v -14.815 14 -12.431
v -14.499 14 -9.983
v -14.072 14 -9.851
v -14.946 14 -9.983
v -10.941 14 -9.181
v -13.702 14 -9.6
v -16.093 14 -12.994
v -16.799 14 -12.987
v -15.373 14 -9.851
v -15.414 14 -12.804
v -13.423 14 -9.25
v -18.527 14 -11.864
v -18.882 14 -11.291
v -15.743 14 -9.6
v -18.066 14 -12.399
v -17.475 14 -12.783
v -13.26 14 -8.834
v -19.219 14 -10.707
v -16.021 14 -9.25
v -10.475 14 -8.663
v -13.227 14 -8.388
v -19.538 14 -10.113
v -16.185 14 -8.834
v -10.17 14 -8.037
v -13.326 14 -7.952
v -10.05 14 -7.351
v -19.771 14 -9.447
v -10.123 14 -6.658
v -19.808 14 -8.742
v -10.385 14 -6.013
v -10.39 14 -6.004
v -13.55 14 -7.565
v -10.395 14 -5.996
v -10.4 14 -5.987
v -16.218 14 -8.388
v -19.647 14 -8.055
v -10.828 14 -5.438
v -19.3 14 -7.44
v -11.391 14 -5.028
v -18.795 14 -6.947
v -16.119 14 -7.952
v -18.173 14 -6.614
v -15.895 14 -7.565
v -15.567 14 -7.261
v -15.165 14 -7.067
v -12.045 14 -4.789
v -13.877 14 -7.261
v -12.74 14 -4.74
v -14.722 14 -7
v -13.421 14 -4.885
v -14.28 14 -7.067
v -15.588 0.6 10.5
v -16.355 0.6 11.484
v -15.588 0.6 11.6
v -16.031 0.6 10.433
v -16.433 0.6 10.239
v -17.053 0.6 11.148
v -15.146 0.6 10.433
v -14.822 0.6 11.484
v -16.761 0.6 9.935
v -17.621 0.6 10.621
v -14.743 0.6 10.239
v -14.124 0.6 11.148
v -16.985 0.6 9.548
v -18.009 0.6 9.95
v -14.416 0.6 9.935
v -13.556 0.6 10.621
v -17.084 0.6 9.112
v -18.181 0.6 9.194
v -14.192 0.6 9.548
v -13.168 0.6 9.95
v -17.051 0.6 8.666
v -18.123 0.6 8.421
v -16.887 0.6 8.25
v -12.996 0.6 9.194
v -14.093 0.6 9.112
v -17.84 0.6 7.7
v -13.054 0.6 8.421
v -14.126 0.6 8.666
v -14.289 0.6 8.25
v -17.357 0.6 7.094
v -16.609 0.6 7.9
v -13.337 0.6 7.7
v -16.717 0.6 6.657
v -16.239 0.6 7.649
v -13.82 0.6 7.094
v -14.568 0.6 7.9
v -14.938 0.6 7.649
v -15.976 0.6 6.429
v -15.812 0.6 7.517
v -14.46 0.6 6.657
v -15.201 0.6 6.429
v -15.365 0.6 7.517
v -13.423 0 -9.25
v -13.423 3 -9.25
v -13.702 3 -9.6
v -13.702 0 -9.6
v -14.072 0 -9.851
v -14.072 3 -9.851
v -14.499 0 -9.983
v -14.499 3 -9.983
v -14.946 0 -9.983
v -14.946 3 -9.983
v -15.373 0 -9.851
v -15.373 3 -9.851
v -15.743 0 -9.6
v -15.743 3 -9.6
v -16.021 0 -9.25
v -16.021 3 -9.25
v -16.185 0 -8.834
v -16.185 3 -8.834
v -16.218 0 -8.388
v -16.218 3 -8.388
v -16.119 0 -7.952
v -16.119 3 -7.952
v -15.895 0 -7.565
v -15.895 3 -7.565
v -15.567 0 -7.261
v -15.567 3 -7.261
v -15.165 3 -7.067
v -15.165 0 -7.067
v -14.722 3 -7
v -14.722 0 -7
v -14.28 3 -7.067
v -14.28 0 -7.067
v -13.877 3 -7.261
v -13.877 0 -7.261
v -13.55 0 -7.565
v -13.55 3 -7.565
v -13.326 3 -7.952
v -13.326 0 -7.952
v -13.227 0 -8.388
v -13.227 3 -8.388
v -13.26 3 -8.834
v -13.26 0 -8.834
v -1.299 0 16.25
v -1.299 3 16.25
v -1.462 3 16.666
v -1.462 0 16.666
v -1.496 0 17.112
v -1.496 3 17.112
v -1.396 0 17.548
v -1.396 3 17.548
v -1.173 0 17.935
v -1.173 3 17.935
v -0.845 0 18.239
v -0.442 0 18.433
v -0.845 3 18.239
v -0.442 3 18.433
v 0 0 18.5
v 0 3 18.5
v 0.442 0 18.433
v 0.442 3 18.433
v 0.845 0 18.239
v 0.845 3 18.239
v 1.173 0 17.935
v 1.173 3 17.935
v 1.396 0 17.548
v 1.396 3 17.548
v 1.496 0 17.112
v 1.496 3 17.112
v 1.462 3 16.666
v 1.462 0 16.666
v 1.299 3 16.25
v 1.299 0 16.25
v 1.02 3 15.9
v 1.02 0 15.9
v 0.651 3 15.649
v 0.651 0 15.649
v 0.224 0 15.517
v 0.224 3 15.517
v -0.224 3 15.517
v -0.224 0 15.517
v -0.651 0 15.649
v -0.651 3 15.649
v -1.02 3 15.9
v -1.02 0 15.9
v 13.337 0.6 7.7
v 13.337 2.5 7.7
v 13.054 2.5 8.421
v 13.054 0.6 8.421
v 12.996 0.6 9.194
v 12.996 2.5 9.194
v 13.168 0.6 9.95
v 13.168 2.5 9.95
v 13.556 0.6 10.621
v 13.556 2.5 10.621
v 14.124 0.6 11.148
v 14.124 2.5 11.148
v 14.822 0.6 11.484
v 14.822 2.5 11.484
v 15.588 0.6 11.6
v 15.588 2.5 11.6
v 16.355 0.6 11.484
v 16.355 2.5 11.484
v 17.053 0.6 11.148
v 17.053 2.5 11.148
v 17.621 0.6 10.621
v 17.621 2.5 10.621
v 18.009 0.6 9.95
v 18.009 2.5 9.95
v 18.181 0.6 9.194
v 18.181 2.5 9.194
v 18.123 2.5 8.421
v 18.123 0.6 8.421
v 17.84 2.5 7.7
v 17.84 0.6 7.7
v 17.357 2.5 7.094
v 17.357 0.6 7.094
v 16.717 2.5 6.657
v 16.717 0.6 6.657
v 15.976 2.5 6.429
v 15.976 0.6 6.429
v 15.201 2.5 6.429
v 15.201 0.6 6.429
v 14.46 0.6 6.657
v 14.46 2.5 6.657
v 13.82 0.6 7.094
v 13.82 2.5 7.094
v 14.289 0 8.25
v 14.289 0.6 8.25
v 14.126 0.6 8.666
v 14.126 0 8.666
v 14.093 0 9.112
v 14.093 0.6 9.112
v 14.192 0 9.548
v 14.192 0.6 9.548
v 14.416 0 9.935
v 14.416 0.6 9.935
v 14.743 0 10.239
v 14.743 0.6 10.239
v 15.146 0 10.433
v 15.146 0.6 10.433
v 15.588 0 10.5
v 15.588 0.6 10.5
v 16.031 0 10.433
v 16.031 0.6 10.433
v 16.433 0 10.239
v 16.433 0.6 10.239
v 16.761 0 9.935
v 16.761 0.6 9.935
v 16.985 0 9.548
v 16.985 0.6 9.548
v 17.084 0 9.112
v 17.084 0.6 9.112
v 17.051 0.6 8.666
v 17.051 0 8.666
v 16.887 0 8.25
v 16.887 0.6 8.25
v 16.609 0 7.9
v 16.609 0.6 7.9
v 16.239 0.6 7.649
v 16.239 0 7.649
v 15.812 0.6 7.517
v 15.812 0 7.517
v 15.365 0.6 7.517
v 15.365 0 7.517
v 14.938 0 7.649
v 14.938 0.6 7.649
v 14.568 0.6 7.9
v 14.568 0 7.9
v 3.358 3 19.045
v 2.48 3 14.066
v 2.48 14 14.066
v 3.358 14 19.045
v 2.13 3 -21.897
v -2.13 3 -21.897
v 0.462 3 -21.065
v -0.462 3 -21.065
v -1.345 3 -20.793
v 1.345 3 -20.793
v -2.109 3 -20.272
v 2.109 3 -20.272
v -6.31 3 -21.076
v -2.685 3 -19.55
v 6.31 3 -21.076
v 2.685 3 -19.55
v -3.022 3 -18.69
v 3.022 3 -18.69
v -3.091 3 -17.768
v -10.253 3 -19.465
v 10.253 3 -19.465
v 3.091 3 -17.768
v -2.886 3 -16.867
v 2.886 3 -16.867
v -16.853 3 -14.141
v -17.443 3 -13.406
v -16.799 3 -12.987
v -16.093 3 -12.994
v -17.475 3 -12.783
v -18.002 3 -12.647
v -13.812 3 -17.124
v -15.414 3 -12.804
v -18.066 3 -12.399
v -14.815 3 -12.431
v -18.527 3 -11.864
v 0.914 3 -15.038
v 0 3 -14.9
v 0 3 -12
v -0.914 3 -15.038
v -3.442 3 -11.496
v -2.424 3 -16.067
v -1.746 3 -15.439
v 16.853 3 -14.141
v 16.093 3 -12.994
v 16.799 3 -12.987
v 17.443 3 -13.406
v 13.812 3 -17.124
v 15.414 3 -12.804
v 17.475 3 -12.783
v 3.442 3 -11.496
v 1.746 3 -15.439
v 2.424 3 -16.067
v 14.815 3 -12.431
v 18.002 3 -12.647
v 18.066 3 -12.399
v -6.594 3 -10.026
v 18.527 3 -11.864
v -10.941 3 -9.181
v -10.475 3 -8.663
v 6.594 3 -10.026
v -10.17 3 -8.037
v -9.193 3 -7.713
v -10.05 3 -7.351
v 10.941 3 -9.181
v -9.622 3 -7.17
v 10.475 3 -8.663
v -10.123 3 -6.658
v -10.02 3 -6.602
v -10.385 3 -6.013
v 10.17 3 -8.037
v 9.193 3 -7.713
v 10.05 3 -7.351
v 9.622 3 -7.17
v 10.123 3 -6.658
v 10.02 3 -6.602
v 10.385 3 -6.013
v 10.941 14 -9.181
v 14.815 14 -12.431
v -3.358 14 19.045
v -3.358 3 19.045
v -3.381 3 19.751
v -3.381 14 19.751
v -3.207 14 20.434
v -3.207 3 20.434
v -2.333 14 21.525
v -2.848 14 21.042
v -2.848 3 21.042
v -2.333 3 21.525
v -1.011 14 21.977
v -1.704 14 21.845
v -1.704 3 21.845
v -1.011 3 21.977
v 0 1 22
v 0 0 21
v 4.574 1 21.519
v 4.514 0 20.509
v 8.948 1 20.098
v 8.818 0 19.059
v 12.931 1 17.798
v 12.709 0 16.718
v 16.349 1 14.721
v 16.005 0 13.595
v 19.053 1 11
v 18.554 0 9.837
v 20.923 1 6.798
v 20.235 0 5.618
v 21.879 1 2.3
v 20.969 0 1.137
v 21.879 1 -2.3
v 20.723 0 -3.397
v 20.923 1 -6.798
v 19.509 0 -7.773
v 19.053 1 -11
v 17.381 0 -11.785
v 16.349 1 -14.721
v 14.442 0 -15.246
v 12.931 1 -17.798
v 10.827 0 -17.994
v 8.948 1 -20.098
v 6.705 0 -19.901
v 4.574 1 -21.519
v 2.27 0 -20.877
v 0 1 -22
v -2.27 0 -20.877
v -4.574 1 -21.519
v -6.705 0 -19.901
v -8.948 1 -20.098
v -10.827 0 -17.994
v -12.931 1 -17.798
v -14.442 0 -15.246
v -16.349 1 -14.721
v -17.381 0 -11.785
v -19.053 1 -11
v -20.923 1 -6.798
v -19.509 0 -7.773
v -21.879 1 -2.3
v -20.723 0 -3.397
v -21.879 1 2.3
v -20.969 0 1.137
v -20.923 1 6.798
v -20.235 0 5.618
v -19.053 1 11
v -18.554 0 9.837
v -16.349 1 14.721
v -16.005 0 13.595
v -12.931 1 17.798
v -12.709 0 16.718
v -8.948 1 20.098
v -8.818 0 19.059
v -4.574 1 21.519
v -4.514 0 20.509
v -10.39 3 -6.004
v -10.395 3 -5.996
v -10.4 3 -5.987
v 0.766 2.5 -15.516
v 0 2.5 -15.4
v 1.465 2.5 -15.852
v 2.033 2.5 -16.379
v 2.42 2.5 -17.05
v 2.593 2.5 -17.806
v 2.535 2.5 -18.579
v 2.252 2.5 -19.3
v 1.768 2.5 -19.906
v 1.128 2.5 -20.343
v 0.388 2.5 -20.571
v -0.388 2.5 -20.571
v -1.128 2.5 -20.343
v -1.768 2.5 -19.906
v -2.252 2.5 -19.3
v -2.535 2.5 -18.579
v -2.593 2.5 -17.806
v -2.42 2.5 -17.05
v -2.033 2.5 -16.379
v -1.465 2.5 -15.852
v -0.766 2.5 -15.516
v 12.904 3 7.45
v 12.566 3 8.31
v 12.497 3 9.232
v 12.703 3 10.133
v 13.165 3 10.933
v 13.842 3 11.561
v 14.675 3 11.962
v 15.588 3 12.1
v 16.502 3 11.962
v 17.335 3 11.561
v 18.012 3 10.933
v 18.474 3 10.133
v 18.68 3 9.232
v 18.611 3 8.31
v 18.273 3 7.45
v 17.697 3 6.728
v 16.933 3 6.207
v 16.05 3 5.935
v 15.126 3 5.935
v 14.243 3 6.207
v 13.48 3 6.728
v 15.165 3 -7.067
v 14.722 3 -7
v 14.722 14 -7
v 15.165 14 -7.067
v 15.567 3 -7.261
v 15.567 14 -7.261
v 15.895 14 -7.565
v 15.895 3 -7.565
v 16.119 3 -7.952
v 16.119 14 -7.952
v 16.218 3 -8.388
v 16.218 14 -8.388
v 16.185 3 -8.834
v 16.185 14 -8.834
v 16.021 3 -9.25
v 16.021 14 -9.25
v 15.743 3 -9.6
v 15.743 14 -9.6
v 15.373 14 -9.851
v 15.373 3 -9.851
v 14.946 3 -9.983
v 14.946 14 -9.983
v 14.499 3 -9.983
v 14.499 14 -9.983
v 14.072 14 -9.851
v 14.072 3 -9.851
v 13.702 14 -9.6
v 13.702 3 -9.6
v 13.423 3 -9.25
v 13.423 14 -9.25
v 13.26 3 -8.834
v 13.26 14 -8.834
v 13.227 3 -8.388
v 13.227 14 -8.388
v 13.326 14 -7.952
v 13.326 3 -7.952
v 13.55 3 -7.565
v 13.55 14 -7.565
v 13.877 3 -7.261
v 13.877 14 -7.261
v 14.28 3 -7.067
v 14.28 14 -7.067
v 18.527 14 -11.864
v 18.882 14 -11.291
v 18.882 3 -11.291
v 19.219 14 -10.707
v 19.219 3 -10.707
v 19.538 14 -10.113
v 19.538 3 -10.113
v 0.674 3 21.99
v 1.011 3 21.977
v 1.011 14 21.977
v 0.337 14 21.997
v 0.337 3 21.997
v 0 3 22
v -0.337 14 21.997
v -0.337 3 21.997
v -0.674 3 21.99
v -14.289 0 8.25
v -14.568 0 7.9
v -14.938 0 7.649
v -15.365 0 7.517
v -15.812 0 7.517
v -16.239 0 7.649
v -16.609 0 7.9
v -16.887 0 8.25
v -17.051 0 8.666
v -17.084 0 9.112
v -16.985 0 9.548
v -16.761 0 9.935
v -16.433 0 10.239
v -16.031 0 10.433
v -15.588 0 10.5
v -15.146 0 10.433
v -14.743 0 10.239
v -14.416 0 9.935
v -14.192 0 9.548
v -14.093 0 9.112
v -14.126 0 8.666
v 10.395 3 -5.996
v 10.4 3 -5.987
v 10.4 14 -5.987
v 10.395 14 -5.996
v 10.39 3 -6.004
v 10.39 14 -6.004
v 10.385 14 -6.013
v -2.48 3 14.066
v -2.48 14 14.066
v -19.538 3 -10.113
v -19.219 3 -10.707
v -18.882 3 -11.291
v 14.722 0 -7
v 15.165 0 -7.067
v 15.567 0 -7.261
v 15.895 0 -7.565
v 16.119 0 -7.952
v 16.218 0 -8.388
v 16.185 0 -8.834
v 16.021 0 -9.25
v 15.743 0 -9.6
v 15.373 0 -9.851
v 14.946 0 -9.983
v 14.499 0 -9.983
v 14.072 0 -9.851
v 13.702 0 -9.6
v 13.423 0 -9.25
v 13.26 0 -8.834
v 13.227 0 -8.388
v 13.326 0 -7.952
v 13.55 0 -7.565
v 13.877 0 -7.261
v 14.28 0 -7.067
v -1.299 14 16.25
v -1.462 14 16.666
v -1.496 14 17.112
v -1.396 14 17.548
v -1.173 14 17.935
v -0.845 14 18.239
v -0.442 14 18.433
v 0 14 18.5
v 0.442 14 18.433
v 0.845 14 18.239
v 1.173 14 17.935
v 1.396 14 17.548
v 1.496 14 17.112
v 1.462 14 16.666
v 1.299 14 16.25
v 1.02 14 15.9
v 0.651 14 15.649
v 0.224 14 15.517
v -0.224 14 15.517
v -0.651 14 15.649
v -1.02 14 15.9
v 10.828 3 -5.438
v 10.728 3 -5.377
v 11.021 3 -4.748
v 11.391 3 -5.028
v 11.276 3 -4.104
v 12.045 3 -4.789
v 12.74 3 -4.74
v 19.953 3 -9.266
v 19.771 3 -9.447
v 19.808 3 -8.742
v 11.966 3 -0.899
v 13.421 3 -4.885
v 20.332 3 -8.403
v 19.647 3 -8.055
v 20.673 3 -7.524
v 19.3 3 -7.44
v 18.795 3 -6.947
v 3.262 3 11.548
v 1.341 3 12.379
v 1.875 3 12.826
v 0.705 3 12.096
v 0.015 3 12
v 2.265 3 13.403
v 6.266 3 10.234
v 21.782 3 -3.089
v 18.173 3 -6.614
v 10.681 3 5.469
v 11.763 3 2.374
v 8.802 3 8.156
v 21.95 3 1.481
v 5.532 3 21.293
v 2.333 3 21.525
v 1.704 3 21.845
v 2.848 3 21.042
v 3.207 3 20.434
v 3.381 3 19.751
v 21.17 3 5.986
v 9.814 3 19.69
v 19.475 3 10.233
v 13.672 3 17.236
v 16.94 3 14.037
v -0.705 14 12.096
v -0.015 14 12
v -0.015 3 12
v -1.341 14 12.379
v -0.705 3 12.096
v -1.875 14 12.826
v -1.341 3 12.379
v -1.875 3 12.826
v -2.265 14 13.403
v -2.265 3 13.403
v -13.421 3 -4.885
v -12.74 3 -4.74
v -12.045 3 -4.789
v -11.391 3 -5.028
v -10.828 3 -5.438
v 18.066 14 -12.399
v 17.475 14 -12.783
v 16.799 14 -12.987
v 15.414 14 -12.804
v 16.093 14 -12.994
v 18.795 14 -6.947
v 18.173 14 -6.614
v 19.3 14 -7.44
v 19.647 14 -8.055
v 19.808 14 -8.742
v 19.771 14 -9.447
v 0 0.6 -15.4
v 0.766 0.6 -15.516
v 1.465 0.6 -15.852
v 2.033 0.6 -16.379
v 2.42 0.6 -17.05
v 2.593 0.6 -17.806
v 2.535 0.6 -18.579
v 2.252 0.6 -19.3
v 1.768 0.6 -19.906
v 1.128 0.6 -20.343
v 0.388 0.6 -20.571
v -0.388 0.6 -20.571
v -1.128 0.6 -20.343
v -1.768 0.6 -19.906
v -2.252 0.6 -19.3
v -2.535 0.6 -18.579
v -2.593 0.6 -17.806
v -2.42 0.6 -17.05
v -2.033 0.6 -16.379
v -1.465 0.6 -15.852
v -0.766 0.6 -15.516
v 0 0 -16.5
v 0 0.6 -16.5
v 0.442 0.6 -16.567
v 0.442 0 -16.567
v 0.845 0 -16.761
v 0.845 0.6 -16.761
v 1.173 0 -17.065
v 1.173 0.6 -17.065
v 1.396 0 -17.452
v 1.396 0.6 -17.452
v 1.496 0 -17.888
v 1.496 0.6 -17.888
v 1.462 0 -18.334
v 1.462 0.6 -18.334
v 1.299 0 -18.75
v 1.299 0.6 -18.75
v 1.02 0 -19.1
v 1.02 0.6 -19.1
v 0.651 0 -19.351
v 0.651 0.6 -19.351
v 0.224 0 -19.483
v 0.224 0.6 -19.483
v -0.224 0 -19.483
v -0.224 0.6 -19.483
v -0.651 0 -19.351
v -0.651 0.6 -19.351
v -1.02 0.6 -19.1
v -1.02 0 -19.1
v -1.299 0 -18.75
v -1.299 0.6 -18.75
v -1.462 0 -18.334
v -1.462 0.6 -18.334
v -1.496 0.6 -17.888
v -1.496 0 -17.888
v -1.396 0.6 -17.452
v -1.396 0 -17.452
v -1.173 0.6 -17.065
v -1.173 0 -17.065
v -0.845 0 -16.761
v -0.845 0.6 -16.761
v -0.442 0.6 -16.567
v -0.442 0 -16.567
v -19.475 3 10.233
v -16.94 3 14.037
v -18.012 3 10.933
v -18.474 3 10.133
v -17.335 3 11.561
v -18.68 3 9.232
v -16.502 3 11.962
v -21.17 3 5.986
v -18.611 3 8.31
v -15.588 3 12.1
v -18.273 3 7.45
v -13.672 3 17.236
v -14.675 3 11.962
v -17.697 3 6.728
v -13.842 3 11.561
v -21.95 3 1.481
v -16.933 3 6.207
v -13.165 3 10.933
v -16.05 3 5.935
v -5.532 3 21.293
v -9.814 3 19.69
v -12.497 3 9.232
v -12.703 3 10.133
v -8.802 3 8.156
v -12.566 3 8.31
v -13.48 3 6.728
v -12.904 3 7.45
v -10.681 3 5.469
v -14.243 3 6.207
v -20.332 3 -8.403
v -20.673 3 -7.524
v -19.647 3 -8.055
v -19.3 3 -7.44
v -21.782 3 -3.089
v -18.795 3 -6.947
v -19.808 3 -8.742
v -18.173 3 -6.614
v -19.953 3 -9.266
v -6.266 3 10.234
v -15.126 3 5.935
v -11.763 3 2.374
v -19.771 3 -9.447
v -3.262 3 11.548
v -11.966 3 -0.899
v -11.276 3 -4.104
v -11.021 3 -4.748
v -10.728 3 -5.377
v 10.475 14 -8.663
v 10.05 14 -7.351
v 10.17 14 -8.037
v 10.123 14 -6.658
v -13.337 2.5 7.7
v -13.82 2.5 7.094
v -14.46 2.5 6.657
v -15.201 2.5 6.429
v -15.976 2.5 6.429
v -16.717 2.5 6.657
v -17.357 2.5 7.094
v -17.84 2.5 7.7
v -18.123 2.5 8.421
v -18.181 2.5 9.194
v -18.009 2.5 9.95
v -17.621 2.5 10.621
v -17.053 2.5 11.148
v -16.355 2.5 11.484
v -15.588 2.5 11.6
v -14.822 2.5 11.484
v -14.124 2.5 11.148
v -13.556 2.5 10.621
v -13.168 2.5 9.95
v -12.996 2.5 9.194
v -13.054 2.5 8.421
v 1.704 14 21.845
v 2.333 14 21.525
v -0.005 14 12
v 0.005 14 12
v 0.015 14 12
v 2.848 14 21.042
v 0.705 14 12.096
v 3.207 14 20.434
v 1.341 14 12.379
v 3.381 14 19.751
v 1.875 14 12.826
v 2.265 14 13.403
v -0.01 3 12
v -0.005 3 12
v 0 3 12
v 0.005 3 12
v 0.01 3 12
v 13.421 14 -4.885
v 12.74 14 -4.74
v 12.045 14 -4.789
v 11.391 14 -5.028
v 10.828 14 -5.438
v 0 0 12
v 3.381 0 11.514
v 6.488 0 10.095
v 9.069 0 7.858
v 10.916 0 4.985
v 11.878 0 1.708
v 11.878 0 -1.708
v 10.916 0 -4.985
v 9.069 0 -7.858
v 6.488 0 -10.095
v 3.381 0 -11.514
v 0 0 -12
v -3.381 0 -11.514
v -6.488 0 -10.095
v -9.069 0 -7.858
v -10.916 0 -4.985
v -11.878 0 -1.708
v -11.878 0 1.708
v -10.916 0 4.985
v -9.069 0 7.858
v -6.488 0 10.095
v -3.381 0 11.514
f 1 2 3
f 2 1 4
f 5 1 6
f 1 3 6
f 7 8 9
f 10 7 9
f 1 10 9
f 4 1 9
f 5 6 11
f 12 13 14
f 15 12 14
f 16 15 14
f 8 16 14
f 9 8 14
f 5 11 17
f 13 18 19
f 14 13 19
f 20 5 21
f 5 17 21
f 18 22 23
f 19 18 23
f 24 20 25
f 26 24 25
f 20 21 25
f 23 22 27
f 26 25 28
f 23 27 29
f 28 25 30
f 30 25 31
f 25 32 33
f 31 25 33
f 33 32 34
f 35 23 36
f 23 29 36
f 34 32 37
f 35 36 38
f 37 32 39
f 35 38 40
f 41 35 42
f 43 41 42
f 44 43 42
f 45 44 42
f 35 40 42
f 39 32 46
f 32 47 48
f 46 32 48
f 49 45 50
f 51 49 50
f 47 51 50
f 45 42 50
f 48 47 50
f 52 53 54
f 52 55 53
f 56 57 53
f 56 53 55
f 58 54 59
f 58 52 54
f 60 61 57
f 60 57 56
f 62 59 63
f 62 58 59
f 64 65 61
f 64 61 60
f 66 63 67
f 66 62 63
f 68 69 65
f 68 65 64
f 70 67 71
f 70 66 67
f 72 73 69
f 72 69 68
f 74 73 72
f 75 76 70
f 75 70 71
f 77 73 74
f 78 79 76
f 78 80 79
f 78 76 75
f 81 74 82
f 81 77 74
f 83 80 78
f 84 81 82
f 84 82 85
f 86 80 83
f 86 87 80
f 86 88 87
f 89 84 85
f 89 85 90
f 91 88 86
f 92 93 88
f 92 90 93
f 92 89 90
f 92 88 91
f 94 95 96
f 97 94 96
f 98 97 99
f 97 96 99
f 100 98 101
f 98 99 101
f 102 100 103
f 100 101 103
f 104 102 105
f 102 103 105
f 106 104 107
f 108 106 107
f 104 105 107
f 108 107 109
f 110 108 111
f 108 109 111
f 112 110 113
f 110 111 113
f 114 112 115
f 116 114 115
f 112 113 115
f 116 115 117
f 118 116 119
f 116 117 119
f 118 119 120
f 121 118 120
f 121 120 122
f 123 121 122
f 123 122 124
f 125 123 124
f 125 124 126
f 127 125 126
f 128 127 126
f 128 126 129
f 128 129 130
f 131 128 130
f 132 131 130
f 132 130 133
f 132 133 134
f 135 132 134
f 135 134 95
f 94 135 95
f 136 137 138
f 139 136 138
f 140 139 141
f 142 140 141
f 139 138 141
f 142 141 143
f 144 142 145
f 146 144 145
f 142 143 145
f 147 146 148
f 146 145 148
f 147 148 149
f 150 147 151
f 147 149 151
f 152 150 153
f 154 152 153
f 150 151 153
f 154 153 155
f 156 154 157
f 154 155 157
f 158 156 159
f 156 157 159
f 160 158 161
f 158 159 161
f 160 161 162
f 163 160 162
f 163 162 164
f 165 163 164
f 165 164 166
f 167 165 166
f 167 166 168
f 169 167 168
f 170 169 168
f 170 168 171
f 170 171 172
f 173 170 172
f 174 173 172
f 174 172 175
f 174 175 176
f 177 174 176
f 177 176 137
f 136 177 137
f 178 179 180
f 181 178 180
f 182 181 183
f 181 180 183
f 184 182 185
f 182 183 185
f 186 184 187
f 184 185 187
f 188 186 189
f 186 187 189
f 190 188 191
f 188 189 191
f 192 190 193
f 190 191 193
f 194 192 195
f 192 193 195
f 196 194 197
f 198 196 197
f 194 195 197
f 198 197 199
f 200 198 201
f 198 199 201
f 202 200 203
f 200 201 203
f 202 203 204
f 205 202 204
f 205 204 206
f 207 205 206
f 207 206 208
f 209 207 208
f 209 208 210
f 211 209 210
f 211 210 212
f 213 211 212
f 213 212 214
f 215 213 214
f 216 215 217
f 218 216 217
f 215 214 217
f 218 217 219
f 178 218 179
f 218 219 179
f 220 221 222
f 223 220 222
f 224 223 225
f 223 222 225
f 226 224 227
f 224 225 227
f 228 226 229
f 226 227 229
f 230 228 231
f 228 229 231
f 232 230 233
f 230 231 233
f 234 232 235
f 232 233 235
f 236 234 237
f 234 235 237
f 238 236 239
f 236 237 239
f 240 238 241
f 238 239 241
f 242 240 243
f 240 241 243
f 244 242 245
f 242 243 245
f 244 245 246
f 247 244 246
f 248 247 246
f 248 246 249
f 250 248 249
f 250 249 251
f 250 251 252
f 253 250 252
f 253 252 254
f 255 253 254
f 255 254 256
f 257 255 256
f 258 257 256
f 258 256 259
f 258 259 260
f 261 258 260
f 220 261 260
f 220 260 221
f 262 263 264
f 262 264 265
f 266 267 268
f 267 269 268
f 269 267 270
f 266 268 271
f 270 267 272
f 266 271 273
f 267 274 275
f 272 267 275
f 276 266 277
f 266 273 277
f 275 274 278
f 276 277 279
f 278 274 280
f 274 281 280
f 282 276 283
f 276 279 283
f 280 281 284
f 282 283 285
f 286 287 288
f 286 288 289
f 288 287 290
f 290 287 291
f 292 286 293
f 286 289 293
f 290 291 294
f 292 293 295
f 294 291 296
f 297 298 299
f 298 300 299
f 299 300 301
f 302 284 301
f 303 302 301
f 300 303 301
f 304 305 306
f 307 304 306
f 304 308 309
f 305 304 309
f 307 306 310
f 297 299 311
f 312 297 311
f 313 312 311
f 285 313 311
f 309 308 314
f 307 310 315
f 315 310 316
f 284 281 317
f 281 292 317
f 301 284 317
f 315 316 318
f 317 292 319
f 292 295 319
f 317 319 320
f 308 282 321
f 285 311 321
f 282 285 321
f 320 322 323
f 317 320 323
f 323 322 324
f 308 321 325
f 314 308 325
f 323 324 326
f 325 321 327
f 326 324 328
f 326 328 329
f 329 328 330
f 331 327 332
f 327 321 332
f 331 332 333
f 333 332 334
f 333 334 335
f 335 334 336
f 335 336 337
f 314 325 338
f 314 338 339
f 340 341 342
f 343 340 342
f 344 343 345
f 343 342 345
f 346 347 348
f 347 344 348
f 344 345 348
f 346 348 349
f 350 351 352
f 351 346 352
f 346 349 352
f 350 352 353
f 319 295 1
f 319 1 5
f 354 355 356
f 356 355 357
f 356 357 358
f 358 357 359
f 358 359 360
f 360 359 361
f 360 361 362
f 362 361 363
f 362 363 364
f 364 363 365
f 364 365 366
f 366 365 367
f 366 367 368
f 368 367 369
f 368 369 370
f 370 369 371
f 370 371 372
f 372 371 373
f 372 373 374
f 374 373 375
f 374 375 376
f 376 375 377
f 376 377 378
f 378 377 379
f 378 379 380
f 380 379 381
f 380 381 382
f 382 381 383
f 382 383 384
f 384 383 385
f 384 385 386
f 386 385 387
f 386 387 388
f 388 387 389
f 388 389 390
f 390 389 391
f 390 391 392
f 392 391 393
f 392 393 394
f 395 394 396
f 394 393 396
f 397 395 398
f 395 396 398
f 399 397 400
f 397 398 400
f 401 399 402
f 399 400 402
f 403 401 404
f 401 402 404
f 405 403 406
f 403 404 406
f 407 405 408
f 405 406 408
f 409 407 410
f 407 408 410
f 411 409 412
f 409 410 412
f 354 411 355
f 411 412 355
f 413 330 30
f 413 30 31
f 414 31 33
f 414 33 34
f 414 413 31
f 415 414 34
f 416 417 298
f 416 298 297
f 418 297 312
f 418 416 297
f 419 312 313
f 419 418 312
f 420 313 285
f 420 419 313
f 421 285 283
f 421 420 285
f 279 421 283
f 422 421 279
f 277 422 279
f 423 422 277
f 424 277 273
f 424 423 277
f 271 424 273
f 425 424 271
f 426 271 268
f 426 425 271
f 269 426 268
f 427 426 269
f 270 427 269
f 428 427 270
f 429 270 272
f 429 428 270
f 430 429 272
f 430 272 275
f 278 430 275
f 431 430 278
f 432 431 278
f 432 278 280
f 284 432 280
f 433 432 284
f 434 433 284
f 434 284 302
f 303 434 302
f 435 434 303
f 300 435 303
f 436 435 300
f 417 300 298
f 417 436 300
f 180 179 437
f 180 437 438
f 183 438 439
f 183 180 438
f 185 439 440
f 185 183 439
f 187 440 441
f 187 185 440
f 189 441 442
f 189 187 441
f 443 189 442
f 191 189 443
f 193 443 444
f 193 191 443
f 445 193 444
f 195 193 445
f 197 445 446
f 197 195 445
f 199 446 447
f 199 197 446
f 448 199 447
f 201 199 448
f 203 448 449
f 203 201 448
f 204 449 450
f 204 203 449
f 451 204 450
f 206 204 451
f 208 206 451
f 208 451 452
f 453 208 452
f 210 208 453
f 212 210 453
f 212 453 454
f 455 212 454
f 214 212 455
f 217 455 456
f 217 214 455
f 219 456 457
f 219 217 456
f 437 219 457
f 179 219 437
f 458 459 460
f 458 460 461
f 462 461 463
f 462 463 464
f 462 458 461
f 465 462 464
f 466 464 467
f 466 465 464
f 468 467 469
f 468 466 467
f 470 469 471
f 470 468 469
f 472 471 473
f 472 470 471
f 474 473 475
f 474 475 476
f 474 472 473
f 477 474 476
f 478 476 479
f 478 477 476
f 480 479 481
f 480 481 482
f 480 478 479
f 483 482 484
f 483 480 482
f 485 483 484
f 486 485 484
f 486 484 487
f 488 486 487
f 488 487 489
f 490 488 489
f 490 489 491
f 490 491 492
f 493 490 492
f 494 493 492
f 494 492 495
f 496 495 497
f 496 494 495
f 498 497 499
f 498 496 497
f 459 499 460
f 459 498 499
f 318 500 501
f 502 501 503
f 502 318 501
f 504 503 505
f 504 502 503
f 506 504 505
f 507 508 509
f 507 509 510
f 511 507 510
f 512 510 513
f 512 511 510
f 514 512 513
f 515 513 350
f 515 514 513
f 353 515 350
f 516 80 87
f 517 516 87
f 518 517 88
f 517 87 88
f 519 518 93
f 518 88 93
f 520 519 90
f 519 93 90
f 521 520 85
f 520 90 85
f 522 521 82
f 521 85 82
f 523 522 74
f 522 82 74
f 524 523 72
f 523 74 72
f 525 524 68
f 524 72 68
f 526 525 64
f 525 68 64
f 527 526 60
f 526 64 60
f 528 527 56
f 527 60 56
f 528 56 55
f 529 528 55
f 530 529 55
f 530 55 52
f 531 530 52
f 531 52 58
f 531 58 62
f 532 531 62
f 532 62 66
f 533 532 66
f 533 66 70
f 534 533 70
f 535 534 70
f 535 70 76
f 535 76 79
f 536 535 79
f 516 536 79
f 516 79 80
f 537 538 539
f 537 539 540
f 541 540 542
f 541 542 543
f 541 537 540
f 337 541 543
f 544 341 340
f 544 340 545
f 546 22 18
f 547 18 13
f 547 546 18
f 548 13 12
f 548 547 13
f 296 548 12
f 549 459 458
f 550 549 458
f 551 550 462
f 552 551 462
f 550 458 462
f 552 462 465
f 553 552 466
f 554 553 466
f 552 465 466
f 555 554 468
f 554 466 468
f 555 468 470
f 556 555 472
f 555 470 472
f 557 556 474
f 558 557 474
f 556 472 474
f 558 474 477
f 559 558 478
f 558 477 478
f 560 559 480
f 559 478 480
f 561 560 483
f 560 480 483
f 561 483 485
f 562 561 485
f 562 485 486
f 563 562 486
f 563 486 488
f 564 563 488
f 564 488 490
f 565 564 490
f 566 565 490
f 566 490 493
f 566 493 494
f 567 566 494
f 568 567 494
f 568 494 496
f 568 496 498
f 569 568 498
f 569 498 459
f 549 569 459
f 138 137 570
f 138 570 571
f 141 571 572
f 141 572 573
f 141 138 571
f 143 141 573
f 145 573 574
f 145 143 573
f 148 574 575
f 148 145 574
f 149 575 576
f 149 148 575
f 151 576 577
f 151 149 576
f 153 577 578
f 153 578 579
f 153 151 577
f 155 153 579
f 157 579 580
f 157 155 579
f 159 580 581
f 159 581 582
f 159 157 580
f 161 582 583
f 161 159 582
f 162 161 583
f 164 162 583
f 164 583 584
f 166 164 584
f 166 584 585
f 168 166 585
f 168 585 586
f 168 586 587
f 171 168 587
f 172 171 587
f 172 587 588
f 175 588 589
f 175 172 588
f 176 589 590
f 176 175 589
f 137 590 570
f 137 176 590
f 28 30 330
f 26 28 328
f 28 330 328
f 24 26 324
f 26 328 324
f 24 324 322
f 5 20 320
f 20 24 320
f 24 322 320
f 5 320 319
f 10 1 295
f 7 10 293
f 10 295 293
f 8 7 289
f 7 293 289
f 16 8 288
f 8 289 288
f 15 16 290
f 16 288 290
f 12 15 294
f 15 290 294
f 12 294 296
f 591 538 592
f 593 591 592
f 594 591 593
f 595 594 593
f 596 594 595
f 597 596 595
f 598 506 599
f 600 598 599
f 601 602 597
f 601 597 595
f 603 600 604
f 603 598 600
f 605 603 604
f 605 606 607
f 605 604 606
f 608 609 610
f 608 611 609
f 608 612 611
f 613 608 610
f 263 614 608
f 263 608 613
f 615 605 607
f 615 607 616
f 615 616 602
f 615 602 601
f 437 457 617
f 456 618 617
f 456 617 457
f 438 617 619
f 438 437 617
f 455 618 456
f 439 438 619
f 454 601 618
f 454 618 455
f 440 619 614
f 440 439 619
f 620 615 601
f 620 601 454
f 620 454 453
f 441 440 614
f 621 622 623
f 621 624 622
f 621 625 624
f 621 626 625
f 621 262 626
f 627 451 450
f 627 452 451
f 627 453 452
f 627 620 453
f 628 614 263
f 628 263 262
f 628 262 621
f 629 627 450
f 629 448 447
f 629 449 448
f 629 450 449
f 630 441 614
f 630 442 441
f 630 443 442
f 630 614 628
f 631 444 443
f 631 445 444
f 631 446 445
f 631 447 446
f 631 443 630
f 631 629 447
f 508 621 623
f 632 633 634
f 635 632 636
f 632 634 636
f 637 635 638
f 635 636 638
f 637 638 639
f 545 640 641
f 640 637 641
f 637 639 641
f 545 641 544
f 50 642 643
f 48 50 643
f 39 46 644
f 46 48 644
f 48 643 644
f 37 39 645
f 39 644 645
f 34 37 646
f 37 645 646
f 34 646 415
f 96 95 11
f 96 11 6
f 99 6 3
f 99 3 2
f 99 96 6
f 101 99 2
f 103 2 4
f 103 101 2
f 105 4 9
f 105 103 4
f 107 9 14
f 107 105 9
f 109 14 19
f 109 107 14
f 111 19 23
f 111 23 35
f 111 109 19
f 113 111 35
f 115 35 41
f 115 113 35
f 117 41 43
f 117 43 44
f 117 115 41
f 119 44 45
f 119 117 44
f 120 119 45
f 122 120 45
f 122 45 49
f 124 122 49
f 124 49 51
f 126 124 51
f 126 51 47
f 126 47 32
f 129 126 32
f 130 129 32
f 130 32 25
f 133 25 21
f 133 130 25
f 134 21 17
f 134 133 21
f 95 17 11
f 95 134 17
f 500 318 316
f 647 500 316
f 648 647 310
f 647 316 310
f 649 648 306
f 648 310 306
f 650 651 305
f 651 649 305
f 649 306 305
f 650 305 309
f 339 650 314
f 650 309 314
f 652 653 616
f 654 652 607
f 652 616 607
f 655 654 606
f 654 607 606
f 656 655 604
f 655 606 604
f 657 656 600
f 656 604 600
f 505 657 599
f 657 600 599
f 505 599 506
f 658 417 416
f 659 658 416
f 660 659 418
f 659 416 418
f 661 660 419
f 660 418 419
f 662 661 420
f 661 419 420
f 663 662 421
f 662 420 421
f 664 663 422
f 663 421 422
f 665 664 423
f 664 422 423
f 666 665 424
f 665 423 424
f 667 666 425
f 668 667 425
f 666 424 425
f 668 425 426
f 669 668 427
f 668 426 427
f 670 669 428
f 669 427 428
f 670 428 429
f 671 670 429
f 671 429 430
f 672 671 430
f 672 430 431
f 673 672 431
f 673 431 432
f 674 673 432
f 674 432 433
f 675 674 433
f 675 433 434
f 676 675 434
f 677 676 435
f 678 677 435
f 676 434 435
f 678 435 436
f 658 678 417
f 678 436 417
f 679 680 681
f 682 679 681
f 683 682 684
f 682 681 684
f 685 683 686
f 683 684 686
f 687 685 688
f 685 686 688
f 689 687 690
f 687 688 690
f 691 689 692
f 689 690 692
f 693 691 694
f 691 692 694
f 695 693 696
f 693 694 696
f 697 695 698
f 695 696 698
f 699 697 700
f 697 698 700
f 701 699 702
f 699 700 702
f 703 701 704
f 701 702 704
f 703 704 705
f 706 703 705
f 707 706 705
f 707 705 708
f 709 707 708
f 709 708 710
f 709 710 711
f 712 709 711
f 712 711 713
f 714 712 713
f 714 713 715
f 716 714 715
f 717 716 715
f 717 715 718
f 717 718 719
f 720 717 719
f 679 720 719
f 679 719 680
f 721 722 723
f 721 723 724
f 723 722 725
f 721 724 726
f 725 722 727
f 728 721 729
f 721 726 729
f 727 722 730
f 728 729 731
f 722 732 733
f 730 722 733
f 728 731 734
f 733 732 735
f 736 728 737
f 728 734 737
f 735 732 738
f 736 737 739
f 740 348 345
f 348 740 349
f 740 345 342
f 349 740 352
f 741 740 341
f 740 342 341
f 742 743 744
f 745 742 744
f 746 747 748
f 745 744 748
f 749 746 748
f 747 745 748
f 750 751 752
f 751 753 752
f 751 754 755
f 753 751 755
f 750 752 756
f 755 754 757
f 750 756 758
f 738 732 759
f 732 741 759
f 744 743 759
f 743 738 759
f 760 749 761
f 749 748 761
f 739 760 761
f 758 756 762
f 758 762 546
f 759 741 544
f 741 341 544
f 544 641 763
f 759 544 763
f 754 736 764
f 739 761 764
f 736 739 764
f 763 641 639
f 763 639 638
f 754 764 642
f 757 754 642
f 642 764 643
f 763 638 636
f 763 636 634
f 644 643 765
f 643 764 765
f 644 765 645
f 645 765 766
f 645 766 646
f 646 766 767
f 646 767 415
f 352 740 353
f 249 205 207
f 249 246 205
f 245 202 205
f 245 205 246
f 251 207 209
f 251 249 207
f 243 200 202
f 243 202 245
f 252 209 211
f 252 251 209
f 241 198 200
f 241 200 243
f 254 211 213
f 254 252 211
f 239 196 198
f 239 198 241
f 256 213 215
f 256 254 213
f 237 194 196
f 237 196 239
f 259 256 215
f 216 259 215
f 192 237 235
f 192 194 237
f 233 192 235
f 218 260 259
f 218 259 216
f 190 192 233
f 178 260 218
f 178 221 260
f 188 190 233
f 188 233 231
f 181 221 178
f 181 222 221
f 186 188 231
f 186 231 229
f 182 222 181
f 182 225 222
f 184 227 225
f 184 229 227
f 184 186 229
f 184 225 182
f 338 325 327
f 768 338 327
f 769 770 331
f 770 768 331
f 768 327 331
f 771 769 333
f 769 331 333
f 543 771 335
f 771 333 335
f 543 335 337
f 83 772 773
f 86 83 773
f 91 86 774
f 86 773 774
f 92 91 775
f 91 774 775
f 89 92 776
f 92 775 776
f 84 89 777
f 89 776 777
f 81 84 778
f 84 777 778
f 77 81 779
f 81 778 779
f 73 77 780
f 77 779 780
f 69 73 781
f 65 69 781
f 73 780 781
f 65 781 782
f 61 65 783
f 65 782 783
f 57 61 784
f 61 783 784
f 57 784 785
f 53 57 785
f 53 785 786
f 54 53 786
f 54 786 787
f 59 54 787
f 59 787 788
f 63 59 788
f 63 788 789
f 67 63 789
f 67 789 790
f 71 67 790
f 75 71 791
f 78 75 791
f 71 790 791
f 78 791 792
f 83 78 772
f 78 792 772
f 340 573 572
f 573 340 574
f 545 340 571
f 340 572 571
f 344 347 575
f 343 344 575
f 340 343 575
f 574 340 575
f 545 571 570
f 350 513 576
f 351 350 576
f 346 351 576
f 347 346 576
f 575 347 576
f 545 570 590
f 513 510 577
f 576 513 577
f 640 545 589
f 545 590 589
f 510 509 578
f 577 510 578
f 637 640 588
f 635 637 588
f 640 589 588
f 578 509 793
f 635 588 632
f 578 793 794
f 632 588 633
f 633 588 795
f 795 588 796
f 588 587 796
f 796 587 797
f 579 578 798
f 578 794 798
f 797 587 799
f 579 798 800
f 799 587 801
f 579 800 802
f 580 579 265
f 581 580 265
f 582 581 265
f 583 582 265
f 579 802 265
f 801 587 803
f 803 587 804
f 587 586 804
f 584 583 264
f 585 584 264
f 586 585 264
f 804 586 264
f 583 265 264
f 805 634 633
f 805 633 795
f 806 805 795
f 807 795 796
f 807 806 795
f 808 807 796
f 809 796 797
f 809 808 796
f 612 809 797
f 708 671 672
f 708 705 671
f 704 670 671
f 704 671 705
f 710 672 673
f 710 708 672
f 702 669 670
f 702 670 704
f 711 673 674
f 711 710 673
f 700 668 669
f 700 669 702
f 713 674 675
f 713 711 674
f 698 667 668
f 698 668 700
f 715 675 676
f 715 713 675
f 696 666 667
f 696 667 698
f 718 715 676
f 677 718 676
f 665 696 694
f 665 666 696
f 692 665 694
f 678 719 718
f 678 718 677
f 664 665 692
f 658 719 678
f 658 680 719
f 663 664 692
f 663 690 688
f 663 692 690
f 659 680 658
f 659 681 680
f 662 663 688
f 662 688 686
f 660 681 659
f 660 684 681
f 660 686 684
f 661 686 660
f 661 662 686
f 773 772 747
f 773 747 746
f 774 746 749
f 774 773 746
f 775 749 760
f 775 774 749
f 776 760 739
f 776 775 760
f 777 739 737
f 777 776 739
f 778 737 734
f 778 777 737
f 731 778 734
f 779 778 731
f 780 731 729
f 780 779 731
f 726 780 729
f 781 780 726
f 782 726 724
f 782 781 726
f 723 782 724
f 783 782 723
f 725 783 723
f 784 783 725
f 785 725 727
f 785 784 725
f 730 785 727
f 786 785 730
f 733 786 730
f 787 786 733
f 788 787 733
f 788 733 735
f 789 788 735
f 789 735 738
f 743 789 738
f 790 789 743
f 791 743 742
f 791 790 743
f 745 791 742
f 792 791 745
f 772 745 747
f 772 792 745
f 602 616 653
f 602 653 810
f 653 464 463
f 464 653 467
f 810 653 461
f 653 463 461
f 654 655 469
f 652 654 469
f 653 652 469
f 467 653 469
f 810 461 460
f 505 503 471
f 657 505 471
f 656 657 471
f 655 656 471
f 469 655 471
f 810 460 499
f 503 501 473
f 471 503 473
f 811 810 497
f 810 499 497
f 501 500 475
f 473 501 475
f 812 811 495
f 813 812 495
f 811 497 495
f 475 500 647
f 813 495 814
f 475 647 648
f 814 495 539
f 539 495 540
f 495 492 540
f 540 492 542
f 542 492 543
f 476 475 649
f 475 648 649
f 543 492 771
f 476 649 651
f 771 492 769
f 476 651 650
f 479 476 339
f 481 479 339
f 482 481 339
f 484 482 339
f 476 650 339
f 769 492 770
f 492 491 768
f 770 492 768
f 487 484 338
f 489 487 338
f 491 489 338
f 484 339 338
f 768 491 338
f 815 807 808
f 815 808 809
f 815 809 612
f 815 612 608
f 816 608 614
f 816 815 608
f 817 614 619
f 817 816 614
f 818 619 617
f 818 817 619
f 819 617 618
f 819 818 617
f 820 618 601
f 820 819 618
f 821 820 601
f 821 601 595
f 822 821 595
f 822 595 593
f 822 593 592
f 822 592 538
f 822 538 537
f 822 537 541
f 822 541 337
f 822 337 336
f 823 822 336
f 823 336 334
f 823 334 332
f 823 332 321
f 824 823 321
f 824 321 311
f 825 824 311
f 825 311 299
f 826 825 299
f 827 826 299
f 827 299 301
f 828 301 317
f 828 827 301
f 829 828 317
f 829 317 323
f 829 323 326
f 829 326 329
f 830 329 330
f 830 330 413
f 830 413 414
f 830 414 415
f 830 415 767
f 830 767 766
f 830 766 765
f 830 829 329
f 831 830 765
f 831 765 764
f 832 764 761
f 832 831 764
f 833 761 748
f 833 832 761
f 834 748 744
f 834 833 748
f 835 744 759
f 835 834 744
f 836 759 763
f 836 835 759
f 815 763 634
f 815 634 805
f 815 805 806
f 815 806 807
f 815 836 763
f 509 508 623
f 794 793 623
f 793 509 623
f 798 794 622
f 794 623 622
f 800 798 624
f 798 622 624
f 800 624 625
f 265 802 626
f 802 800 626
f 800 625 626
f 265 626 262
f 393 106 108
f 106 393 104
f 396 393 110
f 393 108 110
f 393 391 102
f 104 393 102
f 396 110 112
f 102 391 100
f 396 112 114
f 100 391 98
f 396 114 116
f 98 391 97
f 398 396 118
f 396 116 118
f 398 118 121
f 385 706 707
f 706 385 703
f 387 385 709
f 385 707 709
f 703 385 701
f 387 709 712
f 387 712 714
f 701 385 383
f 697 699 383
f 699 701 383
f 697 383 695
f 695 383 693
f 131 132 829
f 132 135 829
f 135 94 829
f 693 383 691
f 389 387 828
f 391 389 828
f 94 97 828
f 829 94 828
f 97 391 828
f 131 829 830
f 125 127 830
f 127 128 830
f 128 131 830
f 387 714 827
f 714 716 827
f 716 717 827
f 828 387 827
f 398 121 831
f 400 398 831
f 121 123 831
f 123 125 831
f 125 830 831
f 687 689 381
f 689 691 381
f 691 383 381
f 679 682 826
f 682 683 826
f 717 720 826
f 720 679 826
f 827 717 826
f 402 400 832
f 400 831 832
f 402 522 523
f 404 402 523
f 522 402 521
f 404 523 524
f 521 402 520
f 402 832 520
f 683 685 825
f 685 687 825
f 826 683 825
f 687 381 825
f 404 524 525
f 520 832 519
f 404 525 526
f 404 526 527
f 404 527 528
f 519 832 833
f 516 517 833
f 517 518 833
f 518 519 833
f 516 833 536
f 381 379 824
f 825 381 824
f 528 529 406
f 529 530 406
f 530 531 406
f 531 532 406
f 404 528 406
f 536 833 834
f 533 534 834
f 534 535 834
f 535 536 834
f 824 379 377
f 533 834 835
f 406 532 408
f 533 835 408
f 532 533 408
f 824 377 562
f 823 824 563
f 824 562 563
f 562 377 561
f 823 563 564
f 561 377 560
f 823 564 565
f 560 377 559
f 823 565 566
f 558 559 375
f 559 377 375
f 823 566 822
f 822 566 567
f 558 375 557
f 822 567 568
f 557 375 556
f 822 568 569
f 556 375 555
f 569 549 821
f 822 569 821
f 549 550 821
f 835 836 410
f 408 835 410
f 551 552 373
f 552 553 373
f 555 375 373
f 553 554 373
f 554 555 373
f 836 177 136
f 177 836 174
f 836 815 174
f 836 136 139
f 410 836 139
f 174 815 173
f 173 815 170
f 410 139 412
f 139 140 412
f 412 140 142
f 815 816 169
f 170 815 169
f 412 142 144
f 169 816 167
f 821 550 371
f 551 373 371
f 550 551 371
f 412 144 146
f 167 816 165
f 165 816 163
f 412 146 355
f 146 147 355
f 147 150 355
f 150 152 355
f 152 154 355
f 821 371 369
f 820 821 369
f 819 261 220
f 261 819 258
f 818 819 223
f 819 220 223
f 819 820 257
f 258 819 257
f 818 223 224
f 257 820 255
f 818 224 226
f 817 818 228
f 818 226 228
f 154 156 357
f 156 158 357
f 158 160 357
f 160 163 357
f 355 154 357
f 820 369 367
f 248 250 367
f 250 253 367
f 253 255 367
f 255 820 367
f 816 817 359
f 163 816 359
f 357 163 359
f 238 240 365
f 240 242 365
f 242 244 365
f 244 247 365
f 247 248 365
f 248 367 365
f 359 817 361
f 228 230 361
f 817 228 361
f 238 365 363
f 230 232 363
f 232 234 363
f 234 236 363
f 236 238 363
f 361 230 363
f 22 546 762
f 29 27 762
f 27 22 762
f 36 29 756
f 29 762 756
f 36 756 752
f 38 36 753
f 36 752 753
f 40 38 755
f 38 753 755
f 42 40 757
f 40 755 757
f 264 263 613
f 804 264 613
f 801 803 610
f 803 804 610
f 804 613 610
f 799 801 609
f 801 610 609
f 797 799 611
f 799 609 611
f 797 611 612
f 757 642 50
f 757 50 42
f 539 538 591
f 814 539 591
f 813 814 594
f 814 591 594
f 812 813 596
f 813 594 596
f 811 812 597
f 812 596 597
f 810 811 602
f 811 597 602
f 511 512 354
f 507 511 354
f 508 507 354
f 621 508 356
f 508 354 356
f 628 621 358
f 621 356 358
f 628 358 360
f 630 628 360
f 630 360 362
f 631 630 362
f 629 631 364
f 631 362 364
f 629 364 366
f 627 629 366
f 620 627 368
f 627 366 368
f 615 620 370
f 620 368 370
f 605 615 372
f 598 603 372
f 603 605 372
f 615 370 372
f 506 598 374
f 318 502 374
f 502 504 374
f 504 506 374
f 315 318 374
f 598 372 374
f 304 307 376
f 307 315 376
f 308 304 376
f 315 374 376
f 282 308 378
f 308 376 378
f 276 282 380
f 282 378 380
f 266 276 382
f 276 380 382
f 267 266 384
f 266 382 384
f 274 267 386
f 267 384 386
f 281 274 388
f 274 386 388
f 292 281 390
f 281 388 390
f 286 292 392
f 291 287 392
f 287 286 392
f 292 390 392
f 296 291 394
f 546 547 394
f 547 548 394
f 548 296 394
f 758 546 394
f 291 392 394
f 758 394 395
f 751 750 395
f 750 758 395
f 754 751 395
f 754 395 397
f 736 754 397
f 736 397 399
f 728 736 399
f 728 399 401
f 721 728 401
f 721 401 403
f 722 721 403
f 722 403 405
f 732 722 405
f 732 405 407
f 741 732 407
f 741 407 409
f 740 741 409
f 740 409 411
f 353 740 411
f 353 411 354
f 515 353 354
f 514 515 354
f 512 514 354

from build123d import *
from build123d.topology import SkipClean

# Parameters (mm, degrees)
SKETCH1_R           = 22
SKETCH1_R_2         = 12
BOSS_EXTRUDE1_DEPTH = 3
SKETCH3_R           = 1.5
CUT_EXTRUDE2_DEPTH  = 32.256999216
SKETCH5_R           = 2.6
CUT_EXTRUDE3_DEPTH  = 2.4
CIRPATTERN1_COUNT   = 3
SKETCH4_R           = 1.5
BOSS_EXTRUDE2_DEPTH = 11
CIRPATTERN2_COUNT   = 3
FILLET1_R           = 2.5
CHAMFER1_SIZE       = 0.5
CHAMFER2_SIZE       = 1


with BuildPart() as part:
    # Sketch1 → Boss-Extrude1 (new body)
    with BuildSketch(Plane(origin=(0, 0, 0), x_dir=(1, 0, 0), z_dir=(0, 1, 0))):
        with Locations(Location((0, 0, 0), (0, 0, 270))):
            Circle(SKETCH1_R)
        with Locations(Location((0, 0, 0), (0, 0, 270))):
            Circle(SKETCH1_R_2, mode=Mode.SUBTRACT)
    extrude(amount=BOSS_EXTRUDE1_DEPTH)

    # Sketch3 → Cut-Extrude2 (cut, through all)
    with BuildSketch(Plane(origin=(0, 3, 0), x_dir=(1, 0, 0), z_dir=(0, 1, 0))):
        with Locations(Location((14.722431864, 8.5, 0), (0, 0, 270))):
            Circle(SKETCH3_R)
        with Locations(Location((0, 18, 0), (0, 0, 270))):
            Circle(SKETCH3_R)
    cut_extrude2 = extrude(amount=-CUT_EXTRUDE2_DEPTH, mode=Mode.SUBTRACT)

    # Sketch5 → Cut-Extrude3 (cut)
    with BuildSketch(Plane(origin=(0, 3, 0), x_dir=(1, 0, 0), z_dir=(0, 1, 0))):
        with Locations(Location((0, 18, 0), (0, 0, 270))):
            Circle(SKETCH5_R)
    cut_extrude3 = extrude(amount=-CUT_EXTRUDE3_DEPTH, mode=Mode.SUBTRACT)

    # CirPattern1: Cut-Extrude2, Cut-Extrude3 ×3 about axis
    cirpattern1_axis = Axis((0, 0, 0), (0, 1, 0))
    add([cut_extrude2.rotate(cirpattern1_axis, i * 360 / CIRPATTERN1_COUNT) for i in range(1, CIRPATTERN1_COUNT)], mode=Mode.SUBTRACT)
    add([cut_extrude3.rotate(cirpattern1_axis, i * 360 / CIRPATTERN1_COUNT) for i in range(1, CIRPATTERN1_COUNT)], mode=Mode.SUBTRACT)

    # Sketch4 → Boss-Extrude2 (add)
    with SkipClean():  # the faces are left unmerged after this step: merging them gives an invalid solid
        with BuildSketch(Plane(origin=(0, 3, 0), x_dir=(1, 0, 0), z_dir=(0, 1, 0))):
            with BuildLine():
                Line((9.192533317, 7.713451316), (16.852977749, 14.141327413))
                ThreePointArc((16.852977749, 14.141327413), (19.052558883, 11), (20.673237657, 7.524443153))
                Line((20.673237657, 7.524443153), (11.276311449, 4.10424172))
                ThreePointArc((11.276311449, 4.10424172), (10.392304845, 6), (9.192533317, 7.713451316))
            make_face()
            with Locations(Location((14.722431864, 8.5, 0), (0, 0, 270))):
                Circle(SKETCH4_R, mode=Mode.SUBTRACT)
        boss_extrude2 = extrude(amount=BOSS_EXTRUDE2_DEPTH)

    # CirPattern2: Boss-Extrude2 ×3 about axis
    with SkipClean():  # the faces are left unmerged after this step: merging them gives an invalid solid
        cirpattern2_axis = Axis((0, 0, 0), (0, 1, 0))
        for i in range(1, CIRPATTERN2_COUNT):
            add(boss_extrude2.rotate(cirpattern2_axis, i * 360 / CIRPATTERN2_COUNT))

    # Fillet1
    # the kernel refuses this fillet: 2.5 mm, written as the material it takes off along each edge
    with BuildSketch(Plane(origin=(9.192533317, 3, -7.713451316), x_dir=(0.7660444431189769, 0, -0.6427876096865408), z_dir=(0, 1, 0)), Plane(origin=(-11.276311449, 3, -4.10424172), x_dir=(-0.9396926207859091, 0, -0.34202014332566705), z_dir=(0, 1, 0)), Plane(origin=(2.083778132, 3, 11.817693036), x_dir=(0.1736481776669318, 0, 0.9848077530122079), z_dir=(0, 1, 0))) as fillet1_piece_1:
        with BuildLine():
            CenterArc((2.282856857, -2.5), FILLET1_R, 90, 80.071808158)
            ThreePointArc((-0.17970467, -2.068965517), (-0.045010582, -1.03837759), (0, 0))
            Line((0, 0), (2.282856857, 0))
        make_face()
    extrude(amount=16.707142143, mode=Mode.SUBTRACT)
    with BuildSketch(Plane(origin=(11.276311449, 3, -4.10424172), x_dir=(0.9396926207859079, 0, -0.34202014332567005), z_dir=(0, 1, 0)), Plane(origin=(-9.192533317, 3, -7.713451316), x_dir=(-0.7660444431189779, 0, -0.6427876096865395), z_dir=(0, 1, 0)), Plane(origin=(-2.083778132, 3, 11.817693036), x_dir=(-0.17364817766692894, 0, 0.9848077530122082), z_dir=(0, 1, 0))) as fillet1_piece_2:
        with BuildLine():
            CenterArc((2.282856857, 2.5), FILLET1_R, 189.928191842, 80.071808158)
            ThreePointArc((-0.17970467, 2.068965517), (-0.045010582, 1.03837759), (0, 0))
            Line((0, 0), (2.282856857, 0))
        make_face()
    extrude(amount=16.707142143, mode=Mode.SUBTRACT)
    with BuildSketch(Plane(origin=(20.673237657, 3, -7.524443153), x_dir=(-0.40167516398546327, 0, -0.9157822135405619), z_dir=(0, 1, 0)), Plane(origin=(-16.852977749, 3, -14.141327413), x_dir=(-0.5922530792673408, 0, 0.8057520028509721), z_dir=(0, 1, 0)), Plane(origin=(-3.820259909, 3, 21.665770566), x_dir=(0.9939282432528036, 0, 0.11003021068958989), z_dir=(0, 1, 0))) as fillet1_piece_3:
        with BuildLine():
            CenterArc((2.66576178, 2.494836964), FILLET1_R, 176.317057086, 97.365885829)
            Line((0.170924817, 2.655425023), (0, 0))
            ThreePointArc((0, 0), (1.41317492, -0.04543472), (2.826349839, 0))
        make_face()
    extrude(amount=18.065874598, mode=Mode.SUBTRACT)
    with BuildSketch(Plane(origin=(16.852977749, 3, -14.141327413), x_dir=(0.5922530792673405, 0, 0.8057520028509723), z_dir=(0, 1, 0)), Plane(origin=(-20.673237657, 3, -7.524443153), x_dir=(0.40167516398546094, 0, -0.9157822135405629), z_dir=(0, 1, 0)), Plane(origin=(3.820259909, 3, 21.665770566), x_dir=(-0.9939282432528035, 0, 0.11003021068959112), z_dir=(0, 1, 0))) as fillet1_piece_4:
        with BuildLine():
            CenterArc((2.66576178, -2.494836964), FILLET1_R, 86.317057086, 97.365885829)
            Line((0.170924817, -2.655425023), (0, 0))
            ThreePointArc((0, 0), (1.41317492, 0.04543472), (2.826349839, 0))
        make_face()
    extrude(amount=18.065874598, mode=Mode.SUBTRACT)

    # Chamfer1
    chamfer1_edges = [part.edges().sort_by_distance(p)[0] for p in [
        (0, 3, -20.6),
        (17.840123318, 3, 10.3),
        (-17.840123318, 3, 10.3),
    ]]
    chamfer(chamfer1_edges, length=CHAMFER1_SIZE)

    # Chamfer2
    chamfer2_edges = [part.edges().sort_by_distance(p)[0] for p in [
        (0, 0, -22),
    ]]
    chamfer(chamfer2_edges, length=CHAMFER2_SIZE)


solid = part.part
